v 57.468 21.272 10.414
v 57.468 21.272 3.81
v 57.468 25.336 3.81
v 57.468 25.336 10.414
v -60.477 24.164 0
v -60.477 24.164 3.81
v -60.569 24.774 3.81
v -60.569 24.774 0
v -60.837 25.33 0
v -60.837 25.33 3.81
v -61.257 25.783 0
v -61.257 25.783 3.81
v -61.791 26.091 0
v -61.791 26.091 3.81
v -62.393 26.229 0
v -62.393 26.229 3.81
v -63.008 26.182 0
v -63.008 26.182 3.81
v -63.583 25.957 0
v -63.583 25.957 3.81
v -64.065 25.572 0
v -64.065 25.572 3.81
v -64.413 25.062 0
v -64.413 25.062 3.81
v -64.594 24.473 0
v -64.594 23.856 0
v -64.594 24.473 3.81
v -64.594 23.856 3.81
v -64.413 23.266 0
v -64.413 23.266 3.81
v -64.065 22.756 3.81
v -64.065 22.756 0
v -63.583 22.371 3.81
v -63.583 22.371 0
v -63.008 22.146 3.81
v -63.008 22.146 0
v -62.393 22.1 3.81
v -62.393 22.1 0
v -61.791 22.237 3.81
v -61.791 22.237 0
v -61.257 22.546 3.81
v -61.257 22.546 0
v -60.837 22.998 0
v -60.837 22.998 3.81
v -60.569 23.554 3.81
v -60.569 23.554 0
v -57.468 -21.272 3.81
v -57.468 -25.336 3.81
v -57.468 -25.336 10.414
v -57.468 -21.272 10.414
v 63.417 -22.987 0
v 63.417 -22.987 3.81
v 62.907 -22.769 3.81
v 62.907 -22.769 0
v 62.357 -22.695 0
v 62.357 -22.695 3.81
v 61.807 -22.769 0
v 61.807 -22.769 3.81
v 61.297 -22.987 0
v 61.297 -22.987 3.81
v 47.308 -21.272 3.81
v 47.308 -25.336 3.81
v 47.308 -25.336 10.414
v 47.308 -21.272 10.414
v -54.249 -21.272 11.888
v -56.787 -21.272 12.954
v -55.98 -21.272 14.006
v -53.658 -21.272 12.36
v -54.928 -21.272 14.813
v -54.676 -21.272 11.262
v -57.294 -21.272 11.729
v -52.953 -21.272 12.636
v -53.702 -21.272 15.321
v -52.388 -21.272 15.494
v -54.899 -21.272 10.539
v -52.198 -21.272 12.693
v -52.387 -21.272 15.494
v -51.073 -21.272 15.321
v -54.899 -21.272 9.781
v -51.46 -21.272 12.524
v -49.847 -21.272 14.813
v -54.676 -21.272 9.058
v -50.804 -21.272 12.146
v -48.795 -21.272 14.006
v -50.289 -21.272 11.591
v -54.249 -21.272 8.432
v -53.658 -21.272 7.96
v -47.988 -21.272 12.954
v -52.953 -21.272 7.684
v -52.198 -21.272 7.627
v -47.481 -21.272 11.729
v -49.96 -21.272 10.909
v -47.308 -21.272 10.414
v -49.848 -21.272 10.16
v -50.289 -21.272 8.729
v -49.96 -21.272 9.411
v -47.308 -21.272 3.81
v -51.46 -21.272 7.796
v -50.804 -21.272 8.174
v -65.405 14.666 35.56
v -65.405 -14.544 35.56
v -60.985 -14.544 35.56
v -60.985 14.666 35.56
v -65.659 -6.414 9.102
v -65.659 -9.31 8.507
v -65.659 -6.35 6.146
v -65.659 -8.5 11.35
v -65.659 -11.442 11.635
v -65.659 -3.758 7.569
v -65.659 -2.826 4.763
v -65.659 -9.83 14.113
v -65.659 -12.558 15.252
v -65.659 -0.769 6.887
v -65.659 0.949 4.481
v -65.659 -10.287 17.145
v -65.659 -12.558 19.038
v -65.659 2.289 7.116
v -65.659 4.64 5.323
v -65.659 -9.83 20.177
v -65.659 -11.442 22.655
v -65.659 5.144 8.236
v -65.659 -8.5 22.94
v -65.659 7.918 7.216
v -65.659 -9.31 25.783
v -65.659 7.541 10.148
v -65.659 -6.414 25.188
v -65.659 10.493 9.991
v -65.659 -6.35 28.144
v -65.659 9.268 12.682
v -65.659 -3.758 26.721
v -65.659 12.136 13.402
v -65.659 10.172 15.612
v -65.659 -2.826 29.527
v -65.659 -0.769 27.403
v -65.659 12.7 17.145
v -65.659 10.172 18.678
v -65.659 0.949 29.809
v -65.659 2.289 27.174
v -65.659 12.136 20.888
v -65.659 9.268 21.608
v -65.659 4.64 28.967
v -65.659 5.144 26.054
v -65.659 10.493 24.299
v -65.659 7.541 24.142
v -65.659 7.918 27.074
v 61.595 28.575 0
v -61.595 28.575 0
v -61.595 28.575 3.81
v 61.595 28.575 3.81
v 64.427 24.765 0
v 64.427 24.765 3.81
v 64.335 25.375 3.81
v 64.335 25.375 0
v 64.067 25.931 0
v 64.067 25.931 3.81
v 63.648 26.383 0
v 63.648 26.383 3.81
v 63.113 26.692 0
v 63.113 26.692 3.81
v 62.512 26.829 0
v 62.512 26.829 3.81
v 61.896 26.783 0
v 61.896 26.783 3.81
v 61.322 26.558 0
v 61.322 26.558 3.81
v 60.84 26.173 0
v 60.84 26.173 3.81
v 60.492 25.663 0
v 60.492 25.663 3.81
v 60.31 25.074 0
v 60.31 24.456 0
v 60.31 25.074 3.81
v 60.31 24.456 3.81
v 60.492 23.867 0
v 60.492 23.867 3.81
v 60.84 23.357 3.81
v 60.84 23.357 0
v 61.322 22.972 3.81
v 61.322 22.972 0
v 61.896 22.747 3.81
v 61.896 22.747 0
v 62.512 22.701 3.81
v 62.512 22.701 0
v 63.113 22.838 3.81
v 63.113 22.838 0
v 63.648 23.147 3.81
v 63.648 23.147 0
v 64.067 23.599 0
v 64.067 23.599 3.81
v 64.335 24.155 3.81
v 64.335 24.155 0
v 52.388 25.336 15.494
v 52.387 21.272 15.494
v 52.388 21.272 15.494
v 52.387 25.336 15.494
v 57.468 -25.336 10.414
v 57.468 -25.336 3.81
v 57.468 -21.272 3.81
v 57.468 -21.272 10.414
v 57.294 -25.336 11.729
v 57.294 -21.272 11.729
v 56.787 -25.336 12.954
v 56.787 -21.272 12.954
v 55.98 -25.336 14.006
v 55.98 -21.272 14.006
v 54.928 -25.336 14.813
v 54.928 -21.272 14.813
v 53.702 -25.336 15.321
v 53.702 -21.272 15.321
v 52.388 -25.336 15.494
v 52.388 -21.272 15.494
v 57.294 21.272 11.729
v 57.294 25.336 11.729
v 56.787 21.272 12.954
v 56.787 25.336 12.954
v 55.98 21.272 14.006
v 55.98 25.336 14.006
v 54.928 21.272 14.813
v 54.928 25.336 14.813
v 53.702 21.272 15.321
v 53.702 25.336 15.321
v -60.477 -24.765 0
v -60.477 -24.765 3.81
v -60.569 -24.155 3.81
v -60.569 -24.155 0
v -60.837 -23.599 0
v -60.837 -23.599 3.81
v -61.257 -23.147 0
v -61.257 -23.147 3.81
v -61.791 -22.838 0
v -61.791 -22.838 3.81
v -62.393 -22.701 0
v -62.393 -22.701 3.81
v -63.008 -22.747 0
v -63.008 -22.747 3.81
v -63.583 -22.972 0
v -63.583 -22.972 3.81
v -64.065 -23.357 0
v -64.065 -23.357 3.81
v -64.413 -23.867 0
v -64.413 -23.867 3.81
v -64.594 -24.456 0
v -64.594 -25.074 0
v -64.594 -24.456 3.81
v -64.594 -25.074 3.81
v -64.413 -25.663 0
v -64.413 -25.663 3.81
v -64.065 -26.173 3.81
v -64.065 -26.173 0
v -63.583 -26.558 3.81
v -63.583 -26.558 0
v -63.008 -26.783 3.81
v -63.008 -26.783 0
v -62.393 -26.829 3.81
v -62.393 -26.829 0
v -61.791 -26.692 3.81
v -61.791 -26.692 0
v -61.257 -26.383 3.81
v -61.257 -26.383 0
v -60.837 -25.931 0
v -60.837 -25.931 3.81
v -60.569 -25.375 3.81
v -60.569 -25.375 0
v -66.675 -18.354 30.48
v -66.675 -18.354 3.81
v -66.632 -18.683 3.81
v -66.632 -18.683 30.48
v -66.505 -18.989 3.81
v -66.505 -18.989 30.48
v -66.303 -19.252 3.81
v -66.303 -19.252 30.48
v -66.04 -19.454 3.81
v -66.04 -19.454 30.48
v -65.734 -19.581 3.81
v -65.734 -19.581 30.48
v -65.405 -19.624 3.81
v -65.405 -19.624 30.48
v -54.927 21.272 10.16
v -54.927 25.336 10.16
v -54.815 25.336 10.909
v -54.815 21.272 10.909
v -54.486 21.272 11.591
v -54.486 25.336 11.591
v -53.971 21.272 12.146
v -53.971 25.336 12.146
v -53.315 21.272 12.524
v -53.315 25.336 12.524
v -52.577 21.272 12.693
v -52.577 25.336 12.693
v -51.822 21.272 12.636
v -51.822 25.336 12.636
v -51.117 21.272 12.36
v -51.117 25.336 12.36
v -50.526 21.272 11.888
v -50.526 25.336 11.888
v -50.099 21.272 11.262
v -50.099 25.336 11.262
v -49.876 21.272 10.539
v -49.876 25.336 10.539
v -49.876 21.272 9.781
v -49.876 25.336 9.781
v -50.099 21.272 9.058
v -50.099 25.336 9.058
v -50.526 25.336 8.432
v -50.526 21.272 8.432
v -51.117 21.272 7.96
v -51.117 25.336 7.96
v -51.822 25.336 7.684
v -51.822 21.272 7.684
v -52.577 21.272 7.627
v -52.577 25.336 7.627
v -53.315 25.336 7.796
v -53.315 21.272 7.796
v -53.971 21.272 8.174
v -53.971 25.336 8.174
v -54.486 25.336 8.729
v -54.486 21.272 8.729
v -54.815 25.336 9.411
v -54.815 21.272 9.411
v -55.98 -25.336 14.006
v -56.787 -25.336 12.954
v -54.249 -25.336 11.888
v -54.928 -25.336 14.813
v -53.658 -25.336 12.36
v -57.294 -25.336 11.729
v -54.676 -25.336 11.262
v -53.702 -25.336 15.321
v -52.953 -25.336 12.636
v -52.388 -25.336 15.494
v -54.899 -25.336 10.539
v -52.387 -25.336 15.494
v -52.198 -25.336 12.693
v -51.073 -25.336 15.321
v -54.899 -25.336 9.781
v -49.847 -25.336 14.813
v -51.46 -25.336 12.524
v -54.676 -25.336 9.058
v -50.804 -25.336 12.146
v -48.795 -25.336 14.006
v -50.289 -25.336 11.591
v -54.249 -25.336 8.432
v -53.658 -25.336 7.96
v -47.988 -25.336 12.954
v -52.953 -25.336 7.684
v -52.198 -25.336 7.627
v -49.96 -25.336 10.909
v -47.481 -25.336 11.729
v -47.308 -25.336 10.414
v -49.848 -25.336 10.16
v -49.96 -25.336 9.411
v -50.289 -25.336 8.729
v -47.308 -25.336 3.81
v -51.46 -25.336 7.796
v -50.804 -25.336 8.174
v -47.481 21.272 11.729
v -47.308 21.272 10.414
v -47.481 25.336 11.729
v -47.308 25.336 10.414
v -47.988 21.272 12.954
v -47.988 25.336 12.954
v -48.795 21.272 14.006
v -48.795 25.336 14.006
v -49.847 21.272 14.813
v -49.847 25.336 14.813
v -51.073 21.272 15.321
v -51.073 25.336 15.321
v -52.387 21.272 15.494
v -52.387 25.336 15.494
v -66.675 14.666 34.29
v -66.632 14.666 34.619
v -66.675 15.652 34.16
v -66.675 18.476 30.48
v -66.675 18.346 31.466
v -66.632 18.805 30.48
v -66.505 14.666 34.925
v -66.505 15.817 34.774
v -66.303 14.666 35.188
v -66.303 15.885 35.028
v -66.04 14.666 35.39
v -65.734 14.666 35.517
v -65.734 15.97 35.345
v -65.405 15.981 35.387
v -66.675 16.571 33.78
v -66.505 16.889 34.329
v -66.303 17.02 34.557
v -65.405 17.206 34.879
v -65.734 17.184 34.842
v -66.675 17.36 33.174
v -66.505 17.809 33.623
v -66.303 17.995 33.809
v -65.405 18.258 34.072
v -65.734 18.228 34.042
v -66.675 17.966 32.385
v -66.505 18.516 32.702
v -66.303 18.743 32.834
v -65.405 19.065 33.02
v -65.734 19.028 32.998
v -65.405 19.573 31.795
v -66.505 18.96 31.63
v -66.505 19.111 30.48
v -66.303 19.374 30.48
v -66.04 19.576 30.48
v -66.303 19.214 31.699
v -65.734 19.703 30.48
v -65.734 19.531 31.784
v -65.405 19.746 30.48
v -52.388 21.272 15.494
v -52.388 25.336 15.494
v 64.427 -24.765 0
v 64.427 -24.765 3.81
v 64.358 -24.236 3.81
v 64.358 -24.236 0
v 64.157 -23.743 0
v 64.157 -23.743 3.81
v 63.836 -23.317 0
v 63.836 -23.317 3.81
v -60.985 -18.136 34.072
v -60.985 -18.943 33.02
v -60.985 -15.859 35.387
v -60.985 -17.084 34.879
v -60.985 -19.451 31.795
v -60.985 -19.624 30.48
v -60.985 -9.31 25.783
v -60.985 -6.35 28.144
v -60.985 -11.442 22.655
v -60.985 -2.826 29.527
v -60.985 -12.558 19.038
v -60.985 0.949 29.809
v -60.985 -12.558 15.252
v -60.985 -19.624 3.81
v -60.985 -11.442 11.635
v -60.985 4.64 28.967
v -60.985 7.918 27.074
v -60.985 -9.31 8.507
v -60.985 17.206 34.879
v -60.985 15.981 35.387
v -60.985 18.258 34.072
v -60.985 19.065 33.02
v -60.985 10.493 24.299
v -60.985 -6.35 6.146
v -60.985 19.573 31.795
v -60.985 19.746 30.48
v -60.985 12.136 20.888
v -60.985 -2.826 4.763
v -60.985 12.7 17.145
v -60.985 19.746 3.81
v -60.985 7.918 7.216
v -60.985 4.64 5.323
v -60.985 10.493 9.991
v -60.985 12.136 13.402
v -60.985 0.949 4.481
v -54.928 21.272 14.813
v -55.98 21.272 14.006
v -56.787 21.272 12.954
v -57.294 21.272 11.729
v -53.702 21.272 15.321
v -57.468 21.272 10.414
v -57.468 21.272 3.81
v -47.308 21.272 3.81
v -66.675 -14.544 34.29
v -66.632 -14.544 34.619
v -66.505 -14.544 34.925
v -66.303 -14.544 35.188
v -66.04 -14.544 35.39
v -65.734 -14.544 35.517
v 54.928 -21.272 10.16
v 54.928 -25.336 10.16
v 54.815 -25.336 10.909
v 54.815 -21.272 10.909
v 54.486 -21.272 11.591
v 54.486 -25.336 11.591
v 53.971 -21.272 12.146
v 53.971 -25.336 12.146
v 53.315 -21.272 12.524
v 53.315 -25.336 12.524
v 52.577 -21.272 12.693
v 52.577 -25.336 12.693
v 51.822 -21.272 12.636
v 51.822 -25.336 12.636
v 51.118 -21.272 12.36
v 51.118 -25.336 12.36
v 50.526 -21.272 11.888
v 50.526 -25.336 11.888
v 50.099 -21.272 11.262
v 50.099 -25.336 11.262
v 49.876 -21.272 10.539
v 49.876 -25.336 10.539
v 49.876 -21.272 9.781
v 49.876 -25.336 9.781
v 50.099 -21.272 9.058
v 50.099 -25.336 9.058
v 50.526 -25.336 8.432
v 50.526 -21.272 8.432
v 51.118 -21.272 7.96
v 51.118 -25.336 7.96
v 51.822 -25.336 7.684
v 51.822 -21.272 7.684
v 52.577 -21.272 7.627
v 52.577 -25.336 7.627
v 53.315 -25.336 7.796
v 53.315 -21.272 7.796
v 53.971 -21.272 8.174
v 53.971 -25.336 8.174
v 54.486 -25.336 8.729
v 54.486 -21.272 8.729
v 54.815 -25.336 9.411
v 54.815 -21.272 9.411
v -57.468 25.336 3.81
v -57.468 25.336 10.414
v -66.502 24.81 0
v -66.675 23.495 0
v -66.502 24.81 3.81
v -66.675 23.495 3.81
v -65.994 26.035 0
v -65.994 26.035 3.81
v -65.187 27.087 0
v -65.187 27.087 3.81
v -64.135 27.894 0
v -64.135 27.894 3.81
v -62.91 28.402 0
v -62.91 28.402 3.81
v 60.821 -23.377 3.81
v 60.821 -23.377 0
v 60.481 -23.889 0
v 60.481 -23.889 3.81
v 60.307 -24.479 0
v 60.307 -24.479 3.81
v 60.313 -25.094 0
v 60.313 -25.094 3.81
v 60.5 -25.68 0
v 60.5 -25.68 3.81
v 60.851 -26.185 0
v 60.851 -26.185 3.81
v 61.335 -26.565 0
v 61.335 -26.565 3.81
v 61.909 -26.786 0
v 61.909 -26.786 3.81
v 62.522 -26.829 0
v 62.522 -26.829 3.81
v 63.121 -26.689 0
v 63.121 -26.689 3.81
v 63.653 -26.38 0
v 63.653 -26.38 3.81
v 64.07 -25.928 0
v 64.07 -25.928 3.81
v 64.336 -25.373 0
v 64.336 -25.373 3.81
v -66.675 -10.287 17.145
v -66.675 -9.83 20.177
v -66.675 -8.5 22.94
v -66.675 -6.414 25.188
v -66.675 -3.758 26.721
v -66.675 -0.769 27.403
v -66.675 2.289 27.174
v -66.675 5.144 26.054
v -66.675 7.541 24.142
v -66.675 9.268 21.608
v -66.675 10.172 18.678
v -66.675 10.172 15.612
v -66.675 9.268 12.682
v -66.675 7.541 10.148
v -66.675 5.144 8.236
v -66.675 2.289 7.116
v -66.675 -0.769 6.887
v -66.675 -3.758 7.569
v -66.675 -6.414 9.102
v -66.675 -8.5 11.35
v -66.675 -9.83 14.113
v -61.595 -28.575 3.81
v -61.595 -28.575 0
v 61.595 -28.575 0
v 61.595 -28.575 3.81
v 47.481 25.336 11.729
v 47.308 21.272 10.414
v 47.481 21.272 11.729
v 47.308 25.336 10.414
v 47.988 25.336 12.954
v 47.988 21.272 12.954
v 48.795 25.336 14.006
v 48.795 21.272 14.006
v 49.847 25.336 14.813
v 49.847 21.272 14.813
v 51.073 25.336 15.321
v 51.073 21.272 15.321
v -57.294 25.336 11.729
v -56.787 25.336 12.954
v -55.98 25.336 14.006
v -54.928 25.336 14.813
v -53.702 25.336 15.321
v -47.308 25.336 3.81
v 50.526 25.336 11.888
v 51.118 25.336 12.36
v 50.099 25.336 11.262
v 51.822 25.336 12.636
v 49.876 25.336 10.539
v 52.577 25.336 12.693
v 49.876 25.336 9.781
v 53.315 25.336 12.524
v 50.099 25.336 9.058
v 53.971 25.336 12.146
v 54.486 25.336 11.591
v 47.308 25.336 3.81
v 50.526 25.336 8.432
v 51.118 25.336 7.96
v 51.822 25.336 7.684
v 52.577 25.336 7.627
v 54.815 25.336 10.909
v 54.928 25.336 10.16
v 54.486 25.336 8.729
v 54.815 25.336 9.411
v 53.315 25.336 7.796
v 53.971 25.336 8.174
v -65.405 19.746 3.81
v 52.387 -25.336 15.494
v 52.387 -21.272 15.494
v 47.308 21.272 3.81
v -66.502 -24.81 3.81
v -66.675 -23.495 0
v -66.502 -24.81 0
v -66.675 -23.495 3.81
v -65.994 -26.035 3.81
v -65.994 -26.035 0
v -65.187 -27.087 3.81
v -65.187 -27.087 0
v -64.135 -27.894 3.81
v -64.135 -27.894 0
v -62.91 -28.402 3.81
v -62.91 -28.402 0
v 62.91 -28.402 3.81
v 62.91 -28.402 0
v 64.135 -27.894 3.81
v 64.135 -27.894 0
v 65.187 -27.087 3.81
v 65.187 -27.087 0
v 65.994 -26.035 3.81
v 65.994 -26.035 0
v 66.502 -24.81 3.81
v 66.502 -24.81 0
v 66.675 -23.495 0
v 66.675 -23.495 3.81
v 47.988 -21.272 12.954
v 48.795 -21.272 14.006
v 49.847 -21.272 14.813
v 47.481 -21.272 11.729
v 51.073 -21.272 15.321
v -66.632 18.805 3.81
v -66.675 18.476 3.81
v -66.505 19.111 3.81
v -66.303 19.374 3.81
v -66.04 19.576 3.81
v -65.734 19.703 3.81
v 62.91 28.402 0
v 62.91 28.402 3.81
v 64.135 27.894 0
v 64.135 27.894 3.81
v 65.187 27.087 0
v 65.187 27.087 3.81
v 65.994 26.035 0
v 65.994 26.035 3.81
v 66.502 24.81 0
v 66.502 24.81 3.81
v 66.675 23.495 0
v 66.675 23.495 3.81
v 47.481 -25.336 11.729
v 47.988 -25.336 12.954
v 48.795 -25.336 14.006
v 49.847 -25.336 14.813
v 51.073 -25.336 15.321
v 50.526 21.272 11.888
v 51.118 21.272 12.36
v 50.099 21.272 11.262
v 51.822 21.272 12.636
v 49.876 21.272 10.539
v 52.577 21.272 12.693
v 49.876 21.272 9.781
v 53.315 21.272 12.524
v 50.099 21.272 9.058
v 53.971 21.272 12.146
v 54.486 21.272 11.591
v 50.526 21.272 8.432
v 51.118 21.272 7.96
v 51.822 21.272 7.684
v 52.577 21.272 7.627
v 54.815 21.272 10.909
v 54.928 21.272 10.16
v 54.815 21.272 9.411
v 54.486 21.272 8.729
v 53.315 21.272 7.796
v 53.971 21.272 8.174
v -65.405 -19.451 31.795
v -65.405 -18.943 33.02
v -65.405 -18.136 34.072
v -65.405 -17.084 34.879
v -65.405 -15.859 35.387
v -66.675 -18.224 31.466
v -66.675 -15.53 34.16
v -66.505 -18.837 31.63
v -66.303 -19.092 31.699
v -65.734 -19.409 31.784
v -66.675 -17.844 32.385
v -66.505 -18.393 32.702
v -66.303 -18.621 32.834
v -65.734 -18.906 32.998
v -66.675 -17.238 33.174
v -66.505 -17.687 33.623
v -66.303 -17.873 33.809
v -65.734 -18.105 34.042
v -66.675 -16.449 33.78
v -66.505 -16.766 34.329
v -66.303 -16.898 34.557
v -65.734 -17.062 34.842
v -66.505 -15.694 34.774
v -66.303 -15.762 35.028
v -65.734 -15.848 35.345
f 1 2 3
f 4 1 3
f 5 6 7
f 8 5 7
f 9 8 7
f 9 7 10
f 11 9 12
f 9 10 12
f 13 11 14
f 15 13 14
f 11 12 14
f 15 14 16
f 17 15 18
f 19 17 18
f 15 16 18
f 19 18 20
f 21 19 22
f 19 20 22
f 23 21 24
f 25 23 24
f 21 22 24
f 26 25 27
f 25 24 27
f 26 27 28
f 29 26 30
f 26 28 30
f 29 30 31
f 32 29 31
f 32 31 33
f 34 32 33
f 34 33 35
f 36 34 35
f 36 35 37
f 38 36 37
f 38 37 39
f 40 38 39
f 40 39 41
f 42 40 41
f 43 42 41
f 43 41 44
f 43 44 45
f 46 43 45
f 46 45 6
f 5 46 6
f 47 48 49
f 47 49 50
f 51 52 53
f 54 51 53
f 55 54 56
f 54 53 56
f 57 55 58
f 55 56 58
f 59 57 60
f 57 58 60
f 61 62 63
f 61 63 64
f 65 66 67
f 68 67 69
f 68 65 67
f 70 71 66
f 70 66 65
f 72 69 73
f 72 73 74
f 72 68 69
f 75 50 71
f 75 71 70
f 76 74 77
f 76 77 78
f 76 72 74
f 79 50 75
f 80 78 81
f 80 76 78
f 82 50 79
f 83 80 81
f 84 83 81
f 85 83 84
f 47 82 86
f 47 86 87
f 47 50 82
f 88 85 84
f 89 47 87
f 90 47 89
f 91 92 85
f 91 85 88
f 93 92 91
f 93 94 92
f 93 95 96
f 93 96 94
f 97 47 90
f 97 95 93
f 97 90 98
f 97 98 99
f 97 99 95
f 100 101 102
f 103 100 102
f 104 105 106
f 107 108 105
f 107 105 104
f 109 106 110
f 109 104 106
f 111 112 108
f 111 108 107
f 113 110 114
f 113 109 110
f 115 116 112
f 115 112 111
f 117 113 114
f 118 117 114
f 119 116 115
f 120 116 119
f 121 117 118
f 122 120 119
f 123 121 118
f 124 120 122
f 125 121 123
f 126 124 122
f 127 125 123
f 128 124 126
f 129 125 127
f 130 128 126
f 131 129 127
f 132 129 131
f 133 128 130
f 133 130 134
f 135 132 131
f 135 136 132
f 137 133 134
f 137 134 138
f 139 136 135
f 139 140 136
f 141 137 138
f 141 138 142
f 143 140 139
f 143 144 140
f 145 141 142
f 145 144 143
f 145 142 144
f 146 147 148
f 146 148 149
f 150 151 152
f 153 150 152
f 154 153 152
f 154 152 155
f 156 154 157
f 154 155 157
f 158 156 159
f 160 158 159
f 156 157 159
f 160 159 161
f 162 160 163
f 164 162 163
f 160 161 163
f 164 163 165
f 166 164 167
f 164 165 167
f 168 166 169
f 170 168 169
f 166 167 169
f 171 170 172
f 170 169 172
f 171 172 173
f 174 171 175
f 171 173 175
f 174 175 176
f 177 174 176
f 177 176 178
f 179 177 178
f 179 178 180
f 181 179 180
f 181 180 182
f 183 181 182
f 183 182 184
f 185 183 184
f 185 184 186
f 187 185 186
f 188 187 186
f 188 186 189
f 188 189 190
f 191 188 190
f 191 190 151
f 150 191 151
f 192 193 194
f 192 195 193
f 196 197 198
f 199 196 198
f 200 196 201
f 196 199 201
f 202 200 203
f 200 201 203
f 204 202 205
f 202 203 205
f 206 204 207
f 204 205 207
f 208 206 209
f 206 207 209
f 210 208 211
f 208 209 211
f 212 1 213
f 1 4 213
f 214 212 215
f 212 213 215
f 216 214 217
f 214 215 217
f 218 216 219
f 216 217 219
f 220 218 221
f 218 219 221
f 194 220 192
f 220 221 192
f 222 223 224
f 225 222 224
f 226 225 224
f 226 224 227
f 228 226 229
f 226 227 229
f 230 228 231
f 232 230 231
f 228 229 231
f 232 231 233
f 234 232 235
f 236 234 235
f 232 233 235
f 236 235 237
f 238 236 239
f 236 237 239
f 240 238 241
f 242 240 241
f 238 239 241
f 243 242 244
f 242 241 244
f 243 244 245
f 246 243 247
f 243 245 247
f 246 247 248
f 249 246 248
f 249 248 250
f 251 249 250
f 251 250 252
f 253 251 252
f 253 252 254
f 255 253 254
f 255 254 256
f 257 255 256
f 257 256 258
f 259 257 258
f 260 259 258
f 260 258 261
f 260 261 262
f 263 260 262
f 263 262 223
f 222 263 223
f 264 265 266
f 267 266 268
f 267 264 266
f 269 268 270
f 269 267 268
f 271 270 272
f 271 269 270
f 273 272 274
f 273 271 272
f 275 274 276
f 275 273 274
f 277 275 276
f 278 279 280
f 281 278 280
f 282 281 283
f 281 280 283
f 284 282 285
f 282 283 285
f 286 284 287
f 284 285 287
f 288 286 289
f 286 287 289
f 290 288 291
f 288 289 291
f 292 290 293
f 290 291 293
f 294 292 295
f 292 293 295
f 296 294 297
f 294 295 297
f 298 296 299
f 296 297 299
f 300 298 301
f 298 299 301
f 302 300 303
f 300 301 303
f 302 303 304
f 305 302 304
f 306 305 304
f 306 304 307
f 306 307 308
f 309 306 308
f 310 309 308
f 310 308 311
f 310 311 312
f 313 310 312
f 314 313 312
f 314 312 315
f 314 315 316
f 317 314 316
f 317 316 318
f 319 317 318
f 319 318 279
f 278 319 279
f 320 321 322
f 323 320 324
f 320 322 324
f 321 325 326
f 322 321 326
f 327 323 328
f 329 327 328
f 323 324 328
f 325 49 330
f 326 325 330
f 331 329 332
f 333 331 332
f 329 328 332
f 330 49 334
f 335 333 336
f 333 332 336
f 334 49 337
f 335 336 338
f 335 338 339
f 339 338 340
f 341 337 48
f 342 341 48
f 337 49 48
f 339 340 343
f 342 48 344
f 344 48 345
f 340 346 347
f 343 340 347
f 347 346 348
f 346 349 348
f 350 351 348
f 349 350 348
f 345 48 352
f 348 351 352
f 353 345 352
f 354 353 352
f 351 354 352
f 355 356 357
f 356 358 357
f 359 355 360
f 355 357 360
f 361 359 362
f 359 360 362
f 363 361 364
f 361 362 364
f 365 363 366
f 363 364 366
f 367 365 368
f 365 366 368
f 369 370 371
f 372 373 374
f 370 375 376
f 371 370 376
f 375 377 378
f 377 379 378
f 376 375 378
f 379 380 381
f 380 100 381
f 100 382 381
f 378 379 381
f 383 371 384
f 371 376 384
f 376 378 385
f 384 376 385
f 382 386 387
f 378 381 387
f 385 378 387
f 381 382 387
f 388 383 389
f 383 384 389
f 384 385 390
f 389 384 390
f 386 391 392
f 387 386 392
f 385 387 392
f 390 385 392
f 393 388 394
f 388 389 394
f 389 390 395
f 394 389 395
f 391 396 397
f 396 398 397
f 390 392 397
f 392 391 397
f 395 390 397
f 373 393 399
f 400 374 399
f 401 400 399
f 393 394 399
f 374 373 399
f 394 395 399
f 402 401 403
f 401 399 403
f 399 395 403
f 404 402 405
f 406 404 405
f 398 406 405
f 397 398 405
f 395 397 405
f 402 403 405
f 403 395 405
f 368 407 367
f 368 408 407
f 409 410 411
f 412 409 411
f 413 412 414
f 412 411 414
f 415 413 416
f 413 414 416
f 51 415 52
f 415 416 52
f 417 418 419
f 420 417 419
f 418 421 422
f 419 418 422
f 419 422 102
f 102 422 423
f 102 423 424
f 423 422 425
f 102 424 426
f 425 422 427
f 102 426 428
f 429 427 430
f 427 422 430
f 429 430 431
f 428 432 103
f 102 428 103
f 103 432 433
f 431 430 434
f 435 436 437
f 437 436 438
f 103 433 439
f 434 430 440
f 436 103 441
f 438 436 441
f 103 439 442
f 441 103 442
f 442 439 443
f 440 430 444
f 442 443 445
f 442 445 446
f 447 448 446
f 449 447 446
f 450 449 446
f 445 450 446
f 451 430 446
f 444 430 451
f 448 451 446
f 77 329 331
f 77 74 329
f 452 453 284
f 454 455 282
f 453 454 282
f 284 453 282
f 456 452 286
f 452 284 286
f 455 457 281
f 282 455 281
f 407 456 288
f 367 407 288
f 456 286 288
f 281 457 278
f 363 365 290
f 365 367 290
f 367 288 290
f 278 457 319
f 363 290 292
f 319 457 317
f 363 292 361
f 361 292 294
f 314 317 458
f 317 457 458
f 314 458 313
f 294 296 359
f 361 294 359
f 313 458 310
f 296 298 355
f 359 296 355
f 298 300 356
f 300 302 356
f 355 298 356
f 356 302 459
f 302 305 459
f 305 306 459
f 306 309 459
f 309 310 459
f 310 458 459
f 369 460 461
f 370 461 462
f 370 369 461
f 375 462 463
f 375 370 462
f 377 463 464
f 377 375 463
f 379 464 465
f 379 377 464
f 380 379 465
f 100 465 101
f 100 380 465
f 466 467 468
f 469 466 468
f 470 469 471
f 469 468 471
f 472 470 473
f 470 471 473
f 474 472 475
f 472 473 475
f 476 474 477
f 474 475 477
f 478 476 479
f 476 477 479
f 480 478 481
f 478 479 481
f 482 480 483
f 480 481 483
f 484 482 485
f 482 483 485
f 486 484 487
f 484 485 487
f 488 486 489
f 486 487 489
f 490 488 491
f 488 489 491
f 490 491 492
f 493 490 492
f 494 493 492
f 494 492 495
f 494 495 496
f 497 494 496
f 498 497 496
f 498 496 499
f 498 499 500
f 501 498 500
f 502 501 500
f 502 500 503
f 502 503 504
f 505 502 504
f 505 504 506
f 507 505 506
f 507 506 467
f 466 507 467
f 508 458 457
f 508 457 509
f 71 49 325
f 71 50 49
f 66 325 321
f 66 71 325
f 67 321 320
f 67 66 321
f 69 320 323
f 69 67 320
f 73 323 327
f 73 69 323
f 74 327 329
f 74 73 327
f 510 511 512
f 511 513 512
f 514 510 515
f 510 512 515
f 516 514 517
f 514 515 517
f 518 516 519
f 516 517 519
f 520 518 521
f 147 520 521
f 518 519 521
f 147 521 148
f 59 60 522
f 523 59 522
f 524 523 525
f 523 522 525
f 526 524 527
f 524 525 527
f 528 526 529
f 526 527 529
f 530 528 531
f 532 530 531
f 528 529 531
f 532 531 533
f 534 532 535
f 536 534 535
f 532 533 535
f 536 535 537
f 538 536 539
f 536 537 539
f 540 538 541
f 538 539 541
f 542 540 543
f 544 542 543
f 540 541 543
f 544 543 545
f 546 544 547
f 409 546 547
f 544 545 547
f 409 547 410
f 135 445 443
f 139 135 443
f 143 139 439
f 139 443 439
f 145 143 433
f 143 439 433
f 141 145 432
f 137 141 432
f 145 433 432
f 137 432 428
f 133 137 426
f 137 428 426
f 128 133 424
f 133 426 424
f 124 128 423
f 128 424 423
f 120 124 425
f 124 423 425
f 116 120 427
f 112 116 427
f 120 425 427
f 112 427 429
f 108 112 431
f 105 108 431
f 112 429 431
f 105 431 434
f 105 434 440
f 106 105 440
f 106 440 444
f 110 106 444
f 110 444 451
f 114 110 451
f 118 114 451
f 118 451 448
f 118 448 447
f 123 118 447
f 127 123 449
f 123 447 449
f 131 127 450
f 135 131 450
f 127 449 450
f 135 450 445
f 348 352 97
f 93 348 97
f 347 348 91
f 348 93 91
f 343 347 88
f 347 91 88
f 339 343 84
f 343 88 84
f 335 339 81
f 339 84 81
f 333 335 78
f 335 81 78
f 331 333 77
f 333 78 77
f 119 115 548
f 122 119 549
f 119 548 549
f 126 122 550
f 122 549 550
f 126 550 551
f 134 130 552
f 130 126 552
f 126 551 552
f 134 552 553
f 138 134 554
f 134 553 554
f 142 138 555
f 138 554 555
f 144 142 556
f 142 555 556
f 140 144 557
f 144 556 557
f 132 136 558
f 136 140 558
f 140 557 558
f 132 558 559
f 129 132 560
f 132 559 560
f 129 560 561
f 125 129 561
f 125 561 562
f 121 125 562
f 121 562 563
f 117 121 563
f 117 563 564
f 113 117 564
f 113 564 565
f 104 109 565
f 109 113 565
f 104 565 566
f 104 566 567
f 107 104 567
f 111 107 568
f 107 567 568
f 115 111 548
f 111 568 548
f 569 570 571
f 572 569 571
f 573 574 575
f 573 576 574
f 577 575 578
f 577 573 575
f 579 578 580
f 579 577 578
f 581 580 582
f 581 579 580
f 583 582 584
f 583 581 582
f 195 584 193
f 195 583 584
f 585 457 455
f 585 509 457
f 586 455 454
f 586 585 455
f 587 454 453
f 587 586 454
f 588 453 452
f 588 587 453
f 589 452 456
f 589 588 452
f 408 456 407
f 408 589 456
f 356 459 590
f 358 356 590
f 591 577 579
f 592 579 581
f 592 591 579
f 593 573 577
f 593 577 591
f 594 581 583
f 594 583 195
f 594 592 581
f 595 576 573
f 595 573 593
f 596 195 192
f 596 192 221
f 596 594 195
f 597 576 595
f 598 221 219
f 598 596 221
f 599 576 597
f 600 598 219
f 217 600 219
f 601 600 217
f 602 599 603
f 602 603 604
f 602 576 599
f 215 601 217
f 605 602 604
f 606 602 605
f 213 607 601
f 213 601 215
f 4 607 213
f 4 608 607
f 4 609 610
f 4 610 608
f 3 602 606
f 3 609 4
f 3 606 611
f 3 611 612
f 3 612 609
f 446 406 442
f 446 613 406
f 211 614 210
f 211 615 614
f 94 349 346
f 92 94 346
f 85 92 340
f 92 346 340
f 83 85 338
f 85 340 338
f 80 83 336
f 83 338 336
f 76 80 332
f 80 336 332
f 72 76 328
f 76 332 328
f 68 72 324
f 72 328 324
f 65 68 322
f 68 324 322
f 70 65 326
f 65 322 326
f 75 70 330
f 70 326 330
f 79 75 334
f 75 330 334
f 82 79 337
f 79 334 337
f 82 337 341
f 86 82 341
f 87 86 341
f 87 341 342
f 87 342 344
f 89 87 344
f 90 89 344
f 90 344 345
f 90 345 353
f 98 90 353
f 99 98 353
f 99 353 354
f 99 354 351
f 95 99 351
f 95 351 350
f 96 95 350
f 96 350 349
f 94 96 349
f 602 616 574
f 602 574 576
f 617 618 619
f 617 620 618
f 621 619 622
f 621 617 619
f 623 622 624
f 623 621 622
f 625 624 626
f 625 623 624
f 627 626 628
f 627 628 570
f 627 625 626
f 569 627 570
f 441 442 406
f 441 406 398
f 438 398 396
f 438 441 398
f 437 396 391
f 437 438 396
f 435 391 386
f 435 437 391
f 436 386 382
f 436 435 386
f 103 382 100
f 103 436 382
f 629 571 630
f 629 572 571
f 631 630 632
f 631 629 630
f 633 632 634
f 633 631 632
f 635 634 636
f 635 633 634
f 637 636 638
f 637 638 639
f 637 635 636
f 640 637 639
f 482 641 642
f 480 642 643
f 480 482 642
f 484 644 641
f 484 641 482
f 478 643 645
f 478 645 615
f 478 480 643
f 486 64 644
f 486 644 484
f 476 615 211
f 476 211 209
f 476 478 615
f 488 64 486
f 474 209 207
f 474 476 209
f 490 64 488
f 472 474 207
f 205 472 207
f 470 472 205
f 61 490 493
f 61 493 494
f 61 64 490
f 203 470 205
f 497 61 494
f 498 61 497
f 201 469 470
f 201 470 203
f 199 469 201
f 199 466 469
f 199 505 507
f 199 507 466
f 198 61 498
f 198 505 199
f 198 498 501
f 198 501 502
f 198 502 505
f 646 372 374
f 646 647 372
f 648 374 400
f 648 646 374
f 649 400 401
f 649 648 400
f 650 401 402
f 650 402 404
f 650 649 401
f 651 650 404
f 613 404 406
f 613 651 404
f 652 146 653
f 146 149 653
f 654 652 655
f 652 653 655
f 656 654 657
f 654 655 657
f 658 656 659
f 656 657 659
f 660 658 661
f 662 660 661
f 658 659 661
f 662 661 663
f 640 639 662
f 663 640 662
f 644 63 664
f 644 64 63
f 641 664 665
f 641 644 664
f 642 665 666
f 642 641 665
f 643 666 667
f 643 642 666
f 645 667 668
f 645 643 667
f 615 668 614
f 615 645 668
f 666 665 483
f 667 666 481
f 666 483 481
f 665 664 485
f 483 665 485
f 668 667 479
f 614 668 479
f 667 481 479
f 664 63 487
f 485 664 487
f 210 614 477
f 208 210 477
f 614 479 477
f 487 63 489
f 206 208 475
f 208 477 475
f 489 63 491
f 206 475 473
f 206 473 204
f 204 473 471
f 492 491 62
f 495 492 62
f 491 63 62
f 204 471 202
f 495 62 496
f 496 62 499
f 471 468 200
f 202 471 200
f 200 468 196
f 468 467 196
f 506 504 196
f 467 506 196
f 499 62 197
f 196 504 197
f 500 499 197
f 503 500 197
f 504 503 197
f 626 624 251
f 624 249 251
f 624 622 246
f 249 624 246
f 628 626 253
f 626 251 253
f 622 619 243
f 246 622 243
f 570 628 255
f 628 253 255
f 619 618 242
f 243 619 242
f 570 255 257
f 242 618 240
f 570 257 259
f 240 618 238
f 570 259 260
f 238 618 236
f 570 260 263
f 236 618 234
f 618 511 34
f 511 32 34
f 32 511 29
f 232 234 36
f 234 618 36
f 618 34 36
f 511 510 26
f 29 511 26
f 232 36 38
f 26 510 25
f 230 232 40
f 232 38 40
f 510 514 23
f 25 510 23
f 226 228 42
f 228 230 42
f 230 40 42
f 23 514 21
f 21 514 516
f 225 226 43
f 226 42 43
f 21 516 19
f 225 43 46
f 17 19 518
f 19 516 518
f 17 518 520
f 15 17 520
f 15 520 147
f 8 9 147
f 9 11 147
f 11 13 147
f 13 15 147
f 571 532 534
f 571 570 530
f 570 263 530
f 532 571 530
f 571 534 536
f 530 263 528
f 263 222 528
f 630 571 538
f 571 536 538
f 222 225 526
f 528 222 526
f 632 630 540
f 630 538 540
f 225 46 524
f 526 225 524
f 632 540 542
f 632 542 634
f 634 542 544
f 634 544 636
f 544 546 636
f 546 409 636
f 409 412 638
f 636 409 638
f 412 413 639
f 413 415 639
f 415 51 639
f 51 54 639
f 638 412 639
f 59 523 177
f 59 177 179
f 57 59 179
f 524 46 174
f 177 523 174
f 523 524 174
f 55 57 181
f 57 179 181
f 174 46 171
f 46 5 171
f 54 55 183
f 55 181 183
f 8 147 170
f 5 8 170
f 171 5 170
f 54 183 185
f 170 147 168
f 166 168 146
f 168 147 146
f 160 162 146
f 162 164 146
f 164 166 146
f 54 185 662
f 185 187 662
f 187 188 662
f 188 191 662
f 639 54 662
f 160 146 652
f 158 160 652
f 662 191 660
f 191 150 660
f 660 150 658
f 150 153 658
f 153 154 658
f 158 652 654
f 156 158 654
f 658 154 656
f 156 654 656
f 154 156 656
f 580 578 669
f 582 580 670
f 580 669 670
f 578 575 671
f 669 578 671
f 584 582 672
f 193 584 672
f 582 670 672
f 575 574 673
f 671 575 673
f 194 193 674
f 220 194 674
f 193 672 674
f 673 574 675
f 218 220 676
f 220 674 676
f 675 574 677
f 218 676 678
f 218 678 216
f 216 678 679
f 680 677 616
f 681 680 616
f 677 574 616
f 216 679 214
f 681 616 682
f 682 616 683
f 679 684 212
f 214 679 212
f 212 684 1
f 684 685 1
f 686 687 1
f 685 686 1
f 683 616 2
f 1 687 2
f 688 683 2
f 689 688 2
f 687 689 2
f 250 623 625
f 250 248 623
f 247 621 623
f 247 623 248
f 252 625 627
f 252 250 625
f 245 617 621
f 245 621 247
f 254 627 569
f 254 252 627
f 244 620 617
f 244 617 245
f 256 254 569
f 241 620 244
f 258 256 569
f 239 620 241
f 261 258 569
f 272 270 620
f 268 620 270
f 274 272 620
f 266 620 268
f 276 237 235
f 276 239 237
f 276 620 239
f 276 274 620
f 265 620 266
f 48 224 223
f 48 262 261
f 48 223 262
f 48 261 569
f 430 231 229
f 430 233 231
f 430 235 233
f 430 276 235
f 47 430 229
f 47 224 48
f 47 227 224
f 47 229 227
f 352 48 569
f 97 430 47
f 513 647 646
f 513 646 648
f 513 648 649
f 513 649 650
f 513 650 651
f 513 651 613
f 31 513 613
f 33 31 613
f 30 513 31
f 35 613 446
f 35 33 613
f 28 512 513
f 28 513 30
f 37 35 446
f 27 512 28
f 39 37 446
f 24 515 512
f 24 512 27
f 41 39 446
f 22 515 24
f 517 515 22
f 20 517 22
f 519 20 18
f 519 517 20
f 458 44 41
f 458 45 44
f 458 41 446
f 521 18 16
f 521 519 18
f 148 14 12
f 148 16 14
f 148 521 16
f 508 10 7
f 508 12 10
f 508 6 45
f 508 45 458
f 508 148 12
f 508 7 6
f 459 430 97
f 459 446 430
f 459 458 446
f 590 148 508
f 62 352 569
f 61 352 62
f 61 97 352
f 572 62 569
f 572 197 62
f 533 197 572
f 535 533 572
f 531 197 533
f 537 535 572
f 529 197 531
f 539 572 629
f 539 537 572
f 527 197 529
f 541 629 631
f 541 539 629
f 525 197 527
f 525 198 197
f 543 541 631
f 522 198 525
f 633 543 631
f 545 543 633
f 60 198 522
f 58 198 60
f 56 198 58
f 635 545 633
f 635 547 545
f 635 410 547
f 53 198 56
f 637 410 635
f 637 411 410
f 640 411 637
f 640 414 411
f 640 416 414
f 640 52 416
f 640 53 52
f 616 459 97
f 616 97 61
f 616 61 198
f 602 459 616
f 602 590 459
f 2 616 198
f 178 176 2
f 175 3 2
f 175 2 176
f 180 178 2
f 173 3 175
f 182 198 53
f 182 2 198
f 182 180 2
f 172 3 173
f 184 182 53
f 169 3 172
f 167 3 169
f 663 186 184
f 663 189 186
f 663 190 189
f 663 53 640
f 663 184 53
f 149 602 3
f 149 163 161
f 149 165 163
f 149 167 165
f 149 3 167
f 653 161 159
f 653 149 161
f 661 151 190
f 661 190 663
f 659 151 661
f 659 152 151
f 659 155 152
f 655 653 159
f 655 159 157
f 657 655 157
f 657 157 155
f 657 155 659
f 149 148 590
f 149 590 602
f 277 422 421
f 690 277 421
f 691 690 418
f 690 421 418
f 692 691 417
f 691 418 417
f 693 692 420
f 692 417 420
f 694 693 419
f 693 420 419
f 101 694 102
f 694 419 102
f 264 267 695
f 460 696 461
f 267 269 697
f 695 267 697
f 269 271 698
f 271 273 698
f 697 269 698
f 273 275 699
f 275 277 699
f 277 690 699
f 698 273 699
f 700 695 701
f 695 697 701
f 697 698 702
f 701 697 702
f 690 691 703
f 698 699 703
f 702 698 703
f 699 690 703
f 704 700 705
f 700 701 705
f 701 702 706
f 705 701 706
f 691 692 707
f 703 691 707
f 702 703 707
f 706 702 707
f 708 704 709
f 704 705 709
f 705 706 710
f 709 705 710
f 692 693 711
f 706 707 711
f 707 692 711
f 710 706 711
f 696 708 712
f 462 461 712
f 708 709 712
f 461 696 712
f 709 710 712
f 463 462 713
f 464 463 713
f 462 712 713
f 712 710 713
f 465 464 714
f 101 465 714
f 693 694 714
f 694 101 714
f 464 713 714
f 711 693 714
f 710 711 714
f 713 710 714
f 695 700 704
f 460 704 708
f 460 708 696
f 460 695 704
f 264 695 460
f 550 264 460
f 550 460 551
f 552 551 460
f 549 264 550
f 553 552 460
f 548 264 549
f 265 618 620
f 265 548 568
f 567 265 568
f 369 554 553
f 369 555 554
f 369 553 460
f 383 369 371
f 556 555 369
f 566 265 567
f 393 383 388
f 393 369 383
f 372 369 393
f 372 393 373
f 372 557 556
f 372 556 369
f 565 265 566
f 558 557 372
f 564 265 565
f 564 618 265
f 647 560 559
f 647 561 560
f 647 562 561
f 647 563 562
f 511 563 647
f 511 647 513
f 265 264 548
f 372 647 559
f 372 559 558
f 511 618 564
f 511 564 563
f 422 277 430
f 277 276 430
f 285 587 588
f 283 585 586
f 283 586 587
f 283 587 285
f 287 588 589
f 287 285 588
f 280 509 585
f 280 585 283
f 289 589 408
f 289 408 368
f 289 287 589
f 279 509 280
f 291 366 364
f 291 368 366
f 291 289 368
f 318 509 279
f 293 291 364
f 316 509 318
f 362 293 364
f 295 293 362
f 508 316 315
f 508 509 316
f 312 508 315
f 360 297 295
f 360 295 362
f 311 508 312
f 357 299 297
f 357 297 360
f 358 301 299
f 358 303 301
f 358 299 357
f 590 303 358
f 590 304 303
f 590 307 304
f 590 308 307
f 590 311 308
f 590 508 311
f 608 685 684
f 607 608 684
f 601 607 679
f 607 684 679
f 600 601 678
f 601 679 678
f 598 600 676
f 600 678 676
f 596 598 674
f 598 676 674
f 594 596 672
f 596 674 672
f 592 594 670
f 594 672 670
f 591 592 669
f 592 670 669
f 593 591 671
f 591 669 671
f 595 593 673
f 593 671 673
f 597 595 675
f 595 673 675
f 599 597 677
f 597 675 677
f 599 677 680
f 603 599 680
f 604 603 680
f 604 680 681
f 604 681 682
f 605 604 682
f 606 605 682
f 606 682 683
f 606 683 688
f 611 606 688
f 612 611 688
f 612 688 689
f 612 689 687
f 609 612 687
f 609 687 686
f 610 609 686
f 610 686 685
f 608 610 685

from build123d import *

# Parameters (mm, degrees)
F0_W      = 133.35
F0_H      = 57.15
F0_W_2    = 94.615
F0_H_2    = 4.064
F0_W_3    = 10.16
F0_H_3    = 42.545
F1_DEPTH  = 3.81
F2_W      = 5.6896
F2_H      = 39.37
F3_DEPTH  = 31.75
F4_R      = 5.08
F5_R      = 10.287
F6_DEPTH  = 25.4
F7_R      = 2.0701
F8_DEPTH  = 3.811
F9_R      = 5.08
F10_R     = 1.27
F11_R     = 12.7
F11_R_2   = 10.287
F12_DEPTH = 4.6736
F13_DEPTH = 15.494
F14_R     = 2.54
F15_DEPTH = 5.08
F16_R     = 2.54
F17_DEPTH = 25.4
F18_R     = 2.54
F19_DEPTH = 25.4
F20_R     = 2.54
F21_DEPTH = 25.4
F22_R     = 5.07999


# Not quite as in the source:
# - a fillet or chamfer is up to 0.001 mm smaller than in the source, because OpenCascade refuses the exact size


with BuildPart() as f1:
    # F0 (on Top) → F1 (new body)
    with BuildSketch(Plane.XY):
        Rectangle(F0_W, F0_H)
        Polygon((57.4675, -21.2725), (57.4675, -25.3365), (47.3075, -25.3365), (-47.3075, -25.3365), (-57.4675, -25.3365), (-57.4675, -21.2725), (-57.4675, 21.2725), (-57.4675, 25.3365), (-47.3075, 25.3365), (47.3075, 25.3365), (57.4675, 25.3365), (57.4675, 21.2725), align=None, mode=Mode.SUBTRACT)
        with Locations((0, 23.3045)):
            Rectangle(F0_W_2, F0_H_2)
        with Locations((-52.3875, 0)):
            Rectangle(F0_W_3, F0_H_3)
        with Locations((-52.3875, -23.3045)):
            Rectangle(F0_W_3, F0_H_2)
        with Locations((0, -23.3045)):
            Rectangle(F0_W_2, F0_H_2)
        Rectangle(F0_W_2, F0_H_3)
        with Locations((52.3875, 0)):
            Rectangle(F0_W_3, F0_H_3)
        with Locations((52.3875, -23.3045)):
            Rectangle(F0_W_3, F0_H_2)
        with Locations((52.3875, 23.3045)):
            Rectangle(F0_W_3, F0_H_2)
        with Locations((-52.3875, 23.3045)):
            Rectangle(F0_W_3, F0_H_2)
    extrude(amount=F1_DEPTH)

    # F2 (on face) → F3 (join)
    with BuildSketch(Plane.XY.offset(3.81)):
        with Locations((-63.8302, 0.0610498762)):
            Rectangle(F2_W, F2_H)
    extrude(amount=F3_DEPTH)

    # F4
    f4_edges = [f1.edges().sort_by_distance(p)[0] for p in [
        (-63.8302, 19.74605, 35.56),
        (-63.8302, -19.62395, 35.56),
    ]]
    fillet(f4_edges, radius=F4_R)

    # F5 (on face) → F6 (cut)
    with BuildSketch(Plane(origin=(-66.675, 0, 0), x_dir=(0, -1, 0), z_dir=(-1, 0, 0))):
        with Locations((0, 17.145)):
            Circle(F5_R)
    extrude(amount=-F6_DEPTH, mode=Mode.SUBTRACT)

    # F7 (on face) → F8 (cut, through all)
    with BuildSketch(Plane.XY.offset(3.81)):
        with Locations((-62.5474974513, 24.164236586)):
            Circle(F7_R)
        with Locations((62.3570047319, 24.7649991388)):
            Circle(F7_R)
        with BuildLine():
            ThreePointArc((64.4271047319, -24.7650008612), (64.1570098525, -23.7426038856), (63.4172061032, -22.987))
            Line((63.4172061032, -22.987), (61.2968033606, -22.987))
            ThreePointArc((61.2968033606, -22.987), (61.3346077563, -26.5650059818), (64.4271047319, -24.7650008612))
        make_face()
        with BuildLine():
            Line((61.2968033606, -22.987), (63.4172061032, -22.987))
            ThreePointArc((63.4172061032, -22.987), (62.3570047319, -22.6949008612), (61.2968033606, -22.987))
        make_face()
        with Locations((-62.5474974513, -24.7649997473)):
            Circle(F7_R)
    extrude(amount=-F8_DEPTH, mode=Mode.SUBTRACT)

    # F9
    f9_edges = [f1.edges().sort_by_distance(p)[0] for p in [
        (66.675, 28.575, 1.905),
        (-66.675, 28.575, 1.905),
        (-66.675, -28.575, 1.905),
        (66.675, -28.575, 1.905),
    ]]
    fillet(f9_edges, radius=F9_R)

    # F10
    f10_edges = [f1.edges().sort_by_distance(p)[0] for p in [
        (-66.675, 0.06105, 35.56),
    ]]
    fillet(f10_edges, radius=F10_R)

    # F11 (on face) → F12 (cut)
    with BuildSketch(Plane.YZ.offset(-60.9854)):
        with Locations((0, 17.145)):
            Circle(F11_R)
        with Locations((0, 17.145)):
            Circle(F11_R_2, mode=Mode.SUBTRACT)
    extrude(amount=-F12_DEPTH, mode=Mode.SUBTRACT)

    # F0 (on Top) → F13 (join)
    with BuildSketch(Plane.XY):
        with Locations((52.3875, 23.3045)):
            Rectangle(F0_W_3, F0_H_2)
        with Locations((52.3875, -23.3045)):
            Rectangle(F0_W_3, F0_H_2)
        with Locations((-52.3875, 23.3045)):
            Rectangle(F0_W_3, F0_H_2)
        with Locations((-52.3875, -23.3045)):
            Rectangle(F0_W_3, F0_H_2)
    extrude(amount=F13_DEPTH)

    # F14 (on face) → F15 (cut)
    with BuildSketch(Plane(origin=(0, 25.3365, 0), x_dir=(-1, 0, 0), z_dir=(0, 1, 0))):
        with Locations((52.3874983191, 10.1600000635)):
            Circle(F14_R)
    extrude(amount=-F15_DEPTH, mode=Mode.SUBTRACT)

    # F16 (on face) → F17 (cut)
    with BuildSketch(Plane.XZ.offset(25.3365)):
        with Locations((52.3875, 10.16)):
            Circle(F16_R)
    extrude(amount=-F17_DEPTH, mode=Mode.SUBTRACT)

    # F18 (on face) → F19 (cut)
    with BuildSketch(Plane.XZ.offset(-21.2725)):
        with Locations((52.3875, 10.16)):
            Circle(F18_R)
    extrude(amount=-F19_DEPTH, mode=Mode.SUBTRACT)

    # F20 (on face) → F21 (cut)
    with BuildSketch(Plane.XZ.offset(25.3365)):
        with Locations((-52.3875, 10.16)):
            Circle(F20_R)
    extrude(amount=-F21_DEPTH, mode=Mode.SUBTRACT)

    # F22 (radius 5.08 in the source; OpenCascade refuses exactly that, so slightly less here)
    f22_edges = [f1.edges().sort_by_distance(p)[0] for p in [
        (-47.3075, -23.3045, 15.494),
        (-57.4675, -23.3045, 15.494),
        (-57.4675, 23.3045, 15.494),
        (-47.3075, 23.3045, 15.494),
        (47.3075, 23.3045, 15.494),
        (47.3075, -23.3045, 15.494),
        (57.4675, -23.3045, 15.494),
        (57.4675, 23.3045, 15.494),
    ]]
    fillet(f22_edges, radius=F22_R)


solid = f1.part
